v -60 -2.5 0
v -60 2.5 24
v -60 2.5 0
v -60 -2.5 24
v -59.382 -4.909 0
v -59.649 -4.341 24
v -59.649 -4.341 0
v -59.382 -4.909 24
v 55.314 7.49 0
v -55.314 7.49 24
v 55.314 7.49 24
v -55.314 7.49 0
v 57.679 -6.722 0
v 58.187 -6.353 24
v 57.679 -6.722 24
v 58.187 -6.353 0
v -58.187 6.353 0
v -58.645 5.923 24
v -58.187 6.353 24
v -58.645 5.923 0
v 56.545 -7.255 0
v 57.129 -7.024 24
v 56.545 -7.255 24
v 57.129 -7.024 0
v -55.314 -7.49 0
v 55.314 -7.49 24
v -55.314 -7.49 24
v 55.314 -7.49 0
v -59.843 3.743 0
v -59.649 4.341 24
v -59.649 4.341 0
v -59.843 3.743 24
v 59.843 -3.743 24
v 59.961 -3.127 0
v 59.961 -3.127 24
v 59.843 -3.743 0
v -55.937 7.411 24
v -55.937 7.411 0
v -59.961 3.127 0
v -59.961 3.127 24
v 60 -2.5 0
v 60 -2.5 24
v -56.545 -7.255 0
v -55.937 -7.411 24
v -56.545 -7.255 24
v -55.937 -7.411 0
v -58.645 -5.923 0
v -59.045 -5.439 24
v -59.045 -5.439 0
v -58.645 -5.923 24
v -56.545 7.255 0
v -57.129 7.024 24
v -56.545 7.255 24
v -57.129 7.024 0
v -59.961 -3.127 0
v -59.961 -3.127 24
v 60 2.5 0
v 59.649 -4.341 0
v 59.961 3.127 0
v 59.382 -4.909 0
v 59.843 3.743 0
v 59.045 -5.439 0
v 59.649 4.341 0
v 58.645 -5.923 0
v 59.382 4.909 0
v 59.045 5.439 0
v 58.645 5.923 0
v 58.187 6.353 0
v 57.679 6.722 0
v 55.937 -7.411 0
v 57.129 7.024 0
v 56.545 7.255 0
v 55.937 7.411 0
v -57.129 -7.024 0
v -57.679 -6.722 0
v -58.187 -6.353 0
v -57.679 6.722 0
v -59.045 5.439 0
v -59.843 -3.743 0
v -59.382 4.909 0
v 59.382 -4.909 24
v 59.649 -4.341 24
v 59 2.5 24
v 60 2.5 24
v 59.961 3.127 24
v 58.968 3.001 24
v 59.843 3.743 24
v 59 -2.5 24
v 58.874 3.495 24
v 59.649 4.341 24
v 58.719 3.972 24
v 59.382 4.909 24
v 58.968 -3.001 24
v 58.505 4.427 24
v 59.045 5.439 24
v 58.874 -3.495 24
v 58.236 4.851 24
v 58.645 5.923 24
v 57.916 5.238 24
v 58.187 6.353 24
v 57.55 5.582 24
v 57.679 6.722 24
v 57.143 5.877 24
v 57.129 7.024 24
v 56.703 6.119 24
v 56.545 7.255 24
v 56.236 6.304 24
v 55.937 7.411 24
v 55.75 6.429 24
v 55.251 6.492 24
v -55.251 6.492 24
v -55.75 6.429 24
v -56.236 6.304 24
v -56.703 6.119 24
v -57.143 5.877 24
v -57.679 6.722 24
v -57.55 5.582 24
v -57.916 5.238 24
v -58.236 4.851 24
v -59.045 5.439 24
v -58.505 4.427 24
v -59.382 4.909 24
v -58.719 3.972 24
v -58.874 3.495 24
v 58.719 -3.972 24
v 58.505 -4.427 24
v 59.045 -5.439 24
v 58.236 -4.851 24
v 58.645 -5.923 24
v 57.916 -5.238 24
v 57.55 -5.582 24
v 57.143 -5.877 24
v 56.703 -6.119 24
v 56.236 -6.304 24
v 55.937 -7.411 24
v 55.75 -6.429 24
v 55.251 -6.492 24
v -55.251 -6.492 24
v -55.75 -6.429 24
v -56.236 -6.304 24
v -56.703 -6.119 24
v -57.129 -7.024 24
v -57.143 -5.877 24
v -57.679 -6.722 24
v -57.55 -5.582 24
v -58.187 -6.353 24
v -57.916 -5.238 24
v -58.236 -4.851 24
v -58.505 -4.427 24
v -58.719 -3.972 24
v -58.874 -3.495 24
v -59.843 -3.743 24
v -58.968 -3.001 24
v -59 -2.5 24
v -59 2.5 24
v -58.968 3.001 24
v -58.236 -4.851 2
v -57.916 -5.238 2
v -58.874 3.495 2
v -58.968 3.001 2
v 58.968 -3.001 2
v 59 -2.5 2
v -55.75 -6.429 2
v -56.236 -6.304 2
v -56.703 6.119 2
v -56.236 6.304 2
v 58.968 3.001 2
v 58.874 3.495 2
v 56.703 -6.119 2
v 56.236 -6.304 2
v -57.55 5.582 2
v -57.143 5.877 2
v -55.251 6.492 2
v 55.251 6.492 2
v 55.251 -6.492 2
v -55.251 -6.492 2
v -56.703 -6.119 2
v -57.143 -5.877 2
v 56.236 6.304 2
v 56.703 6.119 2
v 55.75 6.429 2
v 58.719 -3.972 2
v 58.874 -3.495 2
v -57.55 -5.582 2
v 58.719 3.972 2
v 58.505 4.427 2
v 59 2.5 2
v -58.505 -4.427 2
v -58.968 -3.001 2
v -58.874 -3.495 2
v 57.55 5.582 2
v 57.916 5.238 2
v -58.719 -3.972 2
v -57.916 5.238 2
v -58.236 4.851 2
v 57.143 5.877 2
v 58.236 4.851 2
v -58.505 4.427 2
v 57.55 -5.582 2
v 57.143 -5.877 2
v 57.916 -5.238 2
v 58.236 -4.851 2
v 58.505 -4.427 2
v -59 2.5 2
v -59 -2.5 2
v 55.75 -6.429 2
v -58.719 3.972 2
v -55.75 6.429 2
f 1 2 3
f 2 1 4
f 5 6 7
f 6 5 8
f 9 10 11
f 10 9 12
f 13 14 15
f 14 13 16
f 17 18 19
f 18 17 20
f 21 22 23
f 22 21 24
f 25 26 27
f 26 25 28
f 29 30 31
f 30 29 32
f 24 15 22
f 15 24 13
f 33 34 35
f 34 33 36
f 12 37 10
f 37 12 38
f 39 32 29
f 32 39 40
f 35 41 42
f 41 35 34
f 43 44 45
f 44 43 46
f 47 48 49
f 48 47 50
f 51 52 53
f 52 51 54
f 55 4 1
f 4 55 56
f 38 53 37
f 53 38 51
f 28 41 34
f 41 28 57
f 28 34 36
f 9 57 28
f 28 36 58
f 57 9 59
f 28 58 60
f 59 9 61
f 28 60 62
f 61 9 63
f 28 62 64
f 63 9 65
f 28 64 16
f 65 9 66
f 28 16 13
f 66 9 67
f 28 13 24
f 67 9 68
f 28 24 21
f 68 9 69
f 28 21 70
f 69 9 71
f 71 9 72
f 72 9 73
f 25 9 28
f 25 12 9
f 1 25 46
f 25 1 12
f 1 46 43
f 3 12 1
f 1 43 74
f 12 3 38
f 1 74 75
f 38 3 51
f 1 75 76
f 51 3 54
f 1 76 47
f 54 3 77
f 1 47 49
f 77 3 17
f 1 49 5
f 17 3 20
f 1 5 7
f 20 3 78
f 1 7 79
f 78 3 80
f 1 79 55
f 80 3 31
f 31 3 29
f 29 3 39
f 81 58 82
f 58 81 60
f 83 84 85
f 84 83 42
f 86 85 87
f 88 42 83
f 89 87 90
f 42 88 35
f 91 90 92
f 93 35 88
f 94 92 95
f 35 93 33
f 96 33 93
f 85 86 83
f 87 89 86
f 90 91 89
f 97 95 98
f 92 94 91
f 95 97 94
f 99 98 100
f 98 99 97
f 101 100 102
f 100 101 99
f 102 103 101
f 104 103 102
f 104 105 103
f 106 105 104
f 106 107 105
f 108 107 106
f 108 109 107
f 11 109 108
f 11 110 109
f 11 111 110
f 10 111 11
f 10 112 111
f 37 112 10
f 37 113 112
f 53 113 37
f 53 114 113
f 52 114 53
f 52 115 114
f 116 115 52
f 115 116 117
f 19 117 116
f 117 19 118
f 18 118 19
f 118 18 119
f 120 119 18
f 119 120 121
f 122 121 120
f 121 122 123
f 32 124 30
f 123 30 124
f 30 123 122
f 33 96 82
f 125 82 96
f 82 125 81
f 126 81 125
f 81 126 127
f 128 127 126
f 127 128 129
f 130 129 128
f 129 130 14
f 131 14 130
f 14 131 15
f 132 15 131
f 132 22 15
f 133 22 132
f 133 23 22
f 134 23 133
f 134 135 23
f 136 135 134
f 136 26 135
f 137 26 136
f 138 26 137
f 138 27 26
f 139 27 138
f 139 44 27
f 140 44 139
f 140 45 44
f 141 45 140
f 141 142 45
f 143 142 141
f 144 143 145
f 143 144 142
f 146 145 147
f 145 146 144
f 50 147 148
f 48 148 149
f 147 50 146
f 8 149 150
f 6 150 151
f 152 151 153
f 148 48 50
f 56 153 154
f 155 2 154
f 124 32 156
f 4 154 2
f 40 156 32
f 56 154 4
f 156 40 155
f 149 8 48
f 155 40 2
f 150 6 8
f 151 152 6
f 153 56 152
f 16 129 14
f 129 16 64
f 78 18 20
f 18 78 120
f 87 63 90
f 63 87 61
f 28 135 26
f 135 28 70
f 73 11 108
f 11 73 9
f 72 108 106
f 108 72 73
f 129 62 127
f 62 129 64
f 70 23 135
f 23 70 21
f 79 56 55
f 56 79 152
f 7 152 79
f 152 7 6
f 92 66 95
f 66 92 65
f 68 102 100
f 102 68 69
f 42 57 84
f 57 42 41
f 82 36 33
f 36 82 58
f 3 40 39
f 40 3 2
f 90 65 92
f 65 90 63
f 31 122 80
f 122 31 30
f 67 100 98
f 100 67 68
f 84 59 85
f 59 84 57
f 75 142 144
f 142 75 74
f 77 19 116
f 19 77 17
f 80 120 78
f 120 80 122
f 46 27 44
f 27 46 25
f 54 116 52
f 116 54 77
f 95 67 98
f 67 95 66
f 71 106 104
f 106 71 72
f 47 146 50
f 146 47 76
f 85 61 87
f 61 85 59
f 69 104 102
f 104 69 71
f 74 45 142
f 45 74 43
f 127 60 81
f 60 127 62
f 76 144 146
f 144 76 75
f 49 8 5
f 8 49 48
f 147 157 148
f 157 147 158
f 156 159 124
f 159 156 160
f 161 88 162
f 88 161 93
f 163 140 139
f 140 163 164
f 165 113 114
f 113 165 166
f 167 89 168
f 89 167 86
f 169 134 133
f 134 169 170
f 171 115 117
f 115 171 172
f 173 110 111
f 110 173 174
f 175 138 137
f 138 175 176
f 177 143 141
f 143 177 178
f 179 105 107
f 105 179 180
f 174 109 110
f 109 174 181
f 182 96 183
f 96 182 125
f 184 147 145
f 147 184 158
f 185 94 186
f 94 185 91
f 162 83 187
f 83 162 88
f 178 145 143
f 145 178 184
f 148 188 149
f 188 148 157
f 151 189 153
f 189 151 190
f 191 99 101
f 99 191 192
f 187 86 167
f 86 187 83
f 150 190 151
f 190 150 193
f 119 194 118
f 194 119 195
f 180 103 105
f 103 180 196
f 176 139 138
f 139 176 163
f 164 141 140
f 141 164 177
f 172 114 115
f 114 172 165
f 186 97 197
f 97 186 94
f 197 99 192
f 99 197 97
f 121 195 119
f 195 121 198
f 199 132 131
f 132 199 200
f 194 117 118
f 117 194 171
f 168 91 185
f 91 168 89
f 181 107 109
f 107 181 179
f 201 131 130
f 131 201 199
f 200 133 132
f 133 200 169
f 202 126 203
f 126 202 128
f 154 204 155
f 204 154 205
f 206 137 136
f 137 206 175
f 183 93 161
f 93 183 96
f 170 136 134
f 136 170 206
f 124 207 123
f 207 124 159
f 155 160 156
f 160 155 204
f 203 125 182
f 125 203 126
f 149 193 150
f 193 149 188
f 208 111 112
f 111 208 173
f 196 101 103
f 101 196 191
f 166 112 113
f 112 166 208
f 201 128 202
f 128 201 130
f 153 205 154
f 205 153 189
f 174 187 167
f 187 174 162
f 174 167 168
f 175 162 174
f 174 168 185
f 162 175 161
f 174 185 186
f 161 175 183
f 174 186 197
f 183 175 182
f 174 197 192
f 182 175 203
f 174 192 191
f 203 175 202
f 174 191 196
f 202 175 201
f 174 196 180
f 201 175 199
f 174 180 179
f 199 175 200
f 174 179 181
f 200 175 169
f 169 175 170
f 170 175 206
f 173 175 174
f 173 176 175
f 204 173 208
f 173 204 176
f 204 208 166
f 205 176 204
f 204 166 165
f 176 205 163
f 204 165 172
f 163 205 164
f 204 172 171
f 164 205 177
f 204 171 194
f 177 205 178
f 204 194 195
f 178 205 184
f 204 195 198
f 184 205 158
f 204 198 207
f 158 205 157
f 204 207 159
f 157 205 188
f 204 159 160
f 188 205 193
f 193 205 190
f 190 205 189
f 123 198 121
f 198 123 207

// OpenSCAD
$fn = 50;


difference() {
	union() {
		hull() {
			translate(v = [-55.0000000000, 2.5000000000, 0]) {
				cylinder(h = 24, r = 5);
			}
			translate(v = [55.0000000000, 2.5000000000, 0]) {
				cylinder(h = 24, r = 5);
			}
			translate(v = [-55.0000000000, -2.5000000000, 0]) {
				cylinder(h = 24, r = 5);
			}
			translate(v = [55.0000000000, -2.5000000000, 0]) {
				cylinder(h = 24, r = 5);
			}
		}
	}
	union() {
		translate(v = [0, 0, 2]) {
			hull() {
				translate(v = [-55.0000000000, 2.5000000000, 0]) {
					cylinder(h = 22, r = 4);
				}
				translate(v = [55.0000000000, 2.5000000000, 0]) {
					cylinder(h = 22, r = 4);
				}
				translate(v = [-55.0000000000, -2.5000000000, 0]) {
					cylinder(h = 22, r = 4);
				}
				translate(v = [55.0000000000, -2.5000000000, 0]) {
					cylinder(h = 22, r = 4);
				}
			}
		}
	}
}
